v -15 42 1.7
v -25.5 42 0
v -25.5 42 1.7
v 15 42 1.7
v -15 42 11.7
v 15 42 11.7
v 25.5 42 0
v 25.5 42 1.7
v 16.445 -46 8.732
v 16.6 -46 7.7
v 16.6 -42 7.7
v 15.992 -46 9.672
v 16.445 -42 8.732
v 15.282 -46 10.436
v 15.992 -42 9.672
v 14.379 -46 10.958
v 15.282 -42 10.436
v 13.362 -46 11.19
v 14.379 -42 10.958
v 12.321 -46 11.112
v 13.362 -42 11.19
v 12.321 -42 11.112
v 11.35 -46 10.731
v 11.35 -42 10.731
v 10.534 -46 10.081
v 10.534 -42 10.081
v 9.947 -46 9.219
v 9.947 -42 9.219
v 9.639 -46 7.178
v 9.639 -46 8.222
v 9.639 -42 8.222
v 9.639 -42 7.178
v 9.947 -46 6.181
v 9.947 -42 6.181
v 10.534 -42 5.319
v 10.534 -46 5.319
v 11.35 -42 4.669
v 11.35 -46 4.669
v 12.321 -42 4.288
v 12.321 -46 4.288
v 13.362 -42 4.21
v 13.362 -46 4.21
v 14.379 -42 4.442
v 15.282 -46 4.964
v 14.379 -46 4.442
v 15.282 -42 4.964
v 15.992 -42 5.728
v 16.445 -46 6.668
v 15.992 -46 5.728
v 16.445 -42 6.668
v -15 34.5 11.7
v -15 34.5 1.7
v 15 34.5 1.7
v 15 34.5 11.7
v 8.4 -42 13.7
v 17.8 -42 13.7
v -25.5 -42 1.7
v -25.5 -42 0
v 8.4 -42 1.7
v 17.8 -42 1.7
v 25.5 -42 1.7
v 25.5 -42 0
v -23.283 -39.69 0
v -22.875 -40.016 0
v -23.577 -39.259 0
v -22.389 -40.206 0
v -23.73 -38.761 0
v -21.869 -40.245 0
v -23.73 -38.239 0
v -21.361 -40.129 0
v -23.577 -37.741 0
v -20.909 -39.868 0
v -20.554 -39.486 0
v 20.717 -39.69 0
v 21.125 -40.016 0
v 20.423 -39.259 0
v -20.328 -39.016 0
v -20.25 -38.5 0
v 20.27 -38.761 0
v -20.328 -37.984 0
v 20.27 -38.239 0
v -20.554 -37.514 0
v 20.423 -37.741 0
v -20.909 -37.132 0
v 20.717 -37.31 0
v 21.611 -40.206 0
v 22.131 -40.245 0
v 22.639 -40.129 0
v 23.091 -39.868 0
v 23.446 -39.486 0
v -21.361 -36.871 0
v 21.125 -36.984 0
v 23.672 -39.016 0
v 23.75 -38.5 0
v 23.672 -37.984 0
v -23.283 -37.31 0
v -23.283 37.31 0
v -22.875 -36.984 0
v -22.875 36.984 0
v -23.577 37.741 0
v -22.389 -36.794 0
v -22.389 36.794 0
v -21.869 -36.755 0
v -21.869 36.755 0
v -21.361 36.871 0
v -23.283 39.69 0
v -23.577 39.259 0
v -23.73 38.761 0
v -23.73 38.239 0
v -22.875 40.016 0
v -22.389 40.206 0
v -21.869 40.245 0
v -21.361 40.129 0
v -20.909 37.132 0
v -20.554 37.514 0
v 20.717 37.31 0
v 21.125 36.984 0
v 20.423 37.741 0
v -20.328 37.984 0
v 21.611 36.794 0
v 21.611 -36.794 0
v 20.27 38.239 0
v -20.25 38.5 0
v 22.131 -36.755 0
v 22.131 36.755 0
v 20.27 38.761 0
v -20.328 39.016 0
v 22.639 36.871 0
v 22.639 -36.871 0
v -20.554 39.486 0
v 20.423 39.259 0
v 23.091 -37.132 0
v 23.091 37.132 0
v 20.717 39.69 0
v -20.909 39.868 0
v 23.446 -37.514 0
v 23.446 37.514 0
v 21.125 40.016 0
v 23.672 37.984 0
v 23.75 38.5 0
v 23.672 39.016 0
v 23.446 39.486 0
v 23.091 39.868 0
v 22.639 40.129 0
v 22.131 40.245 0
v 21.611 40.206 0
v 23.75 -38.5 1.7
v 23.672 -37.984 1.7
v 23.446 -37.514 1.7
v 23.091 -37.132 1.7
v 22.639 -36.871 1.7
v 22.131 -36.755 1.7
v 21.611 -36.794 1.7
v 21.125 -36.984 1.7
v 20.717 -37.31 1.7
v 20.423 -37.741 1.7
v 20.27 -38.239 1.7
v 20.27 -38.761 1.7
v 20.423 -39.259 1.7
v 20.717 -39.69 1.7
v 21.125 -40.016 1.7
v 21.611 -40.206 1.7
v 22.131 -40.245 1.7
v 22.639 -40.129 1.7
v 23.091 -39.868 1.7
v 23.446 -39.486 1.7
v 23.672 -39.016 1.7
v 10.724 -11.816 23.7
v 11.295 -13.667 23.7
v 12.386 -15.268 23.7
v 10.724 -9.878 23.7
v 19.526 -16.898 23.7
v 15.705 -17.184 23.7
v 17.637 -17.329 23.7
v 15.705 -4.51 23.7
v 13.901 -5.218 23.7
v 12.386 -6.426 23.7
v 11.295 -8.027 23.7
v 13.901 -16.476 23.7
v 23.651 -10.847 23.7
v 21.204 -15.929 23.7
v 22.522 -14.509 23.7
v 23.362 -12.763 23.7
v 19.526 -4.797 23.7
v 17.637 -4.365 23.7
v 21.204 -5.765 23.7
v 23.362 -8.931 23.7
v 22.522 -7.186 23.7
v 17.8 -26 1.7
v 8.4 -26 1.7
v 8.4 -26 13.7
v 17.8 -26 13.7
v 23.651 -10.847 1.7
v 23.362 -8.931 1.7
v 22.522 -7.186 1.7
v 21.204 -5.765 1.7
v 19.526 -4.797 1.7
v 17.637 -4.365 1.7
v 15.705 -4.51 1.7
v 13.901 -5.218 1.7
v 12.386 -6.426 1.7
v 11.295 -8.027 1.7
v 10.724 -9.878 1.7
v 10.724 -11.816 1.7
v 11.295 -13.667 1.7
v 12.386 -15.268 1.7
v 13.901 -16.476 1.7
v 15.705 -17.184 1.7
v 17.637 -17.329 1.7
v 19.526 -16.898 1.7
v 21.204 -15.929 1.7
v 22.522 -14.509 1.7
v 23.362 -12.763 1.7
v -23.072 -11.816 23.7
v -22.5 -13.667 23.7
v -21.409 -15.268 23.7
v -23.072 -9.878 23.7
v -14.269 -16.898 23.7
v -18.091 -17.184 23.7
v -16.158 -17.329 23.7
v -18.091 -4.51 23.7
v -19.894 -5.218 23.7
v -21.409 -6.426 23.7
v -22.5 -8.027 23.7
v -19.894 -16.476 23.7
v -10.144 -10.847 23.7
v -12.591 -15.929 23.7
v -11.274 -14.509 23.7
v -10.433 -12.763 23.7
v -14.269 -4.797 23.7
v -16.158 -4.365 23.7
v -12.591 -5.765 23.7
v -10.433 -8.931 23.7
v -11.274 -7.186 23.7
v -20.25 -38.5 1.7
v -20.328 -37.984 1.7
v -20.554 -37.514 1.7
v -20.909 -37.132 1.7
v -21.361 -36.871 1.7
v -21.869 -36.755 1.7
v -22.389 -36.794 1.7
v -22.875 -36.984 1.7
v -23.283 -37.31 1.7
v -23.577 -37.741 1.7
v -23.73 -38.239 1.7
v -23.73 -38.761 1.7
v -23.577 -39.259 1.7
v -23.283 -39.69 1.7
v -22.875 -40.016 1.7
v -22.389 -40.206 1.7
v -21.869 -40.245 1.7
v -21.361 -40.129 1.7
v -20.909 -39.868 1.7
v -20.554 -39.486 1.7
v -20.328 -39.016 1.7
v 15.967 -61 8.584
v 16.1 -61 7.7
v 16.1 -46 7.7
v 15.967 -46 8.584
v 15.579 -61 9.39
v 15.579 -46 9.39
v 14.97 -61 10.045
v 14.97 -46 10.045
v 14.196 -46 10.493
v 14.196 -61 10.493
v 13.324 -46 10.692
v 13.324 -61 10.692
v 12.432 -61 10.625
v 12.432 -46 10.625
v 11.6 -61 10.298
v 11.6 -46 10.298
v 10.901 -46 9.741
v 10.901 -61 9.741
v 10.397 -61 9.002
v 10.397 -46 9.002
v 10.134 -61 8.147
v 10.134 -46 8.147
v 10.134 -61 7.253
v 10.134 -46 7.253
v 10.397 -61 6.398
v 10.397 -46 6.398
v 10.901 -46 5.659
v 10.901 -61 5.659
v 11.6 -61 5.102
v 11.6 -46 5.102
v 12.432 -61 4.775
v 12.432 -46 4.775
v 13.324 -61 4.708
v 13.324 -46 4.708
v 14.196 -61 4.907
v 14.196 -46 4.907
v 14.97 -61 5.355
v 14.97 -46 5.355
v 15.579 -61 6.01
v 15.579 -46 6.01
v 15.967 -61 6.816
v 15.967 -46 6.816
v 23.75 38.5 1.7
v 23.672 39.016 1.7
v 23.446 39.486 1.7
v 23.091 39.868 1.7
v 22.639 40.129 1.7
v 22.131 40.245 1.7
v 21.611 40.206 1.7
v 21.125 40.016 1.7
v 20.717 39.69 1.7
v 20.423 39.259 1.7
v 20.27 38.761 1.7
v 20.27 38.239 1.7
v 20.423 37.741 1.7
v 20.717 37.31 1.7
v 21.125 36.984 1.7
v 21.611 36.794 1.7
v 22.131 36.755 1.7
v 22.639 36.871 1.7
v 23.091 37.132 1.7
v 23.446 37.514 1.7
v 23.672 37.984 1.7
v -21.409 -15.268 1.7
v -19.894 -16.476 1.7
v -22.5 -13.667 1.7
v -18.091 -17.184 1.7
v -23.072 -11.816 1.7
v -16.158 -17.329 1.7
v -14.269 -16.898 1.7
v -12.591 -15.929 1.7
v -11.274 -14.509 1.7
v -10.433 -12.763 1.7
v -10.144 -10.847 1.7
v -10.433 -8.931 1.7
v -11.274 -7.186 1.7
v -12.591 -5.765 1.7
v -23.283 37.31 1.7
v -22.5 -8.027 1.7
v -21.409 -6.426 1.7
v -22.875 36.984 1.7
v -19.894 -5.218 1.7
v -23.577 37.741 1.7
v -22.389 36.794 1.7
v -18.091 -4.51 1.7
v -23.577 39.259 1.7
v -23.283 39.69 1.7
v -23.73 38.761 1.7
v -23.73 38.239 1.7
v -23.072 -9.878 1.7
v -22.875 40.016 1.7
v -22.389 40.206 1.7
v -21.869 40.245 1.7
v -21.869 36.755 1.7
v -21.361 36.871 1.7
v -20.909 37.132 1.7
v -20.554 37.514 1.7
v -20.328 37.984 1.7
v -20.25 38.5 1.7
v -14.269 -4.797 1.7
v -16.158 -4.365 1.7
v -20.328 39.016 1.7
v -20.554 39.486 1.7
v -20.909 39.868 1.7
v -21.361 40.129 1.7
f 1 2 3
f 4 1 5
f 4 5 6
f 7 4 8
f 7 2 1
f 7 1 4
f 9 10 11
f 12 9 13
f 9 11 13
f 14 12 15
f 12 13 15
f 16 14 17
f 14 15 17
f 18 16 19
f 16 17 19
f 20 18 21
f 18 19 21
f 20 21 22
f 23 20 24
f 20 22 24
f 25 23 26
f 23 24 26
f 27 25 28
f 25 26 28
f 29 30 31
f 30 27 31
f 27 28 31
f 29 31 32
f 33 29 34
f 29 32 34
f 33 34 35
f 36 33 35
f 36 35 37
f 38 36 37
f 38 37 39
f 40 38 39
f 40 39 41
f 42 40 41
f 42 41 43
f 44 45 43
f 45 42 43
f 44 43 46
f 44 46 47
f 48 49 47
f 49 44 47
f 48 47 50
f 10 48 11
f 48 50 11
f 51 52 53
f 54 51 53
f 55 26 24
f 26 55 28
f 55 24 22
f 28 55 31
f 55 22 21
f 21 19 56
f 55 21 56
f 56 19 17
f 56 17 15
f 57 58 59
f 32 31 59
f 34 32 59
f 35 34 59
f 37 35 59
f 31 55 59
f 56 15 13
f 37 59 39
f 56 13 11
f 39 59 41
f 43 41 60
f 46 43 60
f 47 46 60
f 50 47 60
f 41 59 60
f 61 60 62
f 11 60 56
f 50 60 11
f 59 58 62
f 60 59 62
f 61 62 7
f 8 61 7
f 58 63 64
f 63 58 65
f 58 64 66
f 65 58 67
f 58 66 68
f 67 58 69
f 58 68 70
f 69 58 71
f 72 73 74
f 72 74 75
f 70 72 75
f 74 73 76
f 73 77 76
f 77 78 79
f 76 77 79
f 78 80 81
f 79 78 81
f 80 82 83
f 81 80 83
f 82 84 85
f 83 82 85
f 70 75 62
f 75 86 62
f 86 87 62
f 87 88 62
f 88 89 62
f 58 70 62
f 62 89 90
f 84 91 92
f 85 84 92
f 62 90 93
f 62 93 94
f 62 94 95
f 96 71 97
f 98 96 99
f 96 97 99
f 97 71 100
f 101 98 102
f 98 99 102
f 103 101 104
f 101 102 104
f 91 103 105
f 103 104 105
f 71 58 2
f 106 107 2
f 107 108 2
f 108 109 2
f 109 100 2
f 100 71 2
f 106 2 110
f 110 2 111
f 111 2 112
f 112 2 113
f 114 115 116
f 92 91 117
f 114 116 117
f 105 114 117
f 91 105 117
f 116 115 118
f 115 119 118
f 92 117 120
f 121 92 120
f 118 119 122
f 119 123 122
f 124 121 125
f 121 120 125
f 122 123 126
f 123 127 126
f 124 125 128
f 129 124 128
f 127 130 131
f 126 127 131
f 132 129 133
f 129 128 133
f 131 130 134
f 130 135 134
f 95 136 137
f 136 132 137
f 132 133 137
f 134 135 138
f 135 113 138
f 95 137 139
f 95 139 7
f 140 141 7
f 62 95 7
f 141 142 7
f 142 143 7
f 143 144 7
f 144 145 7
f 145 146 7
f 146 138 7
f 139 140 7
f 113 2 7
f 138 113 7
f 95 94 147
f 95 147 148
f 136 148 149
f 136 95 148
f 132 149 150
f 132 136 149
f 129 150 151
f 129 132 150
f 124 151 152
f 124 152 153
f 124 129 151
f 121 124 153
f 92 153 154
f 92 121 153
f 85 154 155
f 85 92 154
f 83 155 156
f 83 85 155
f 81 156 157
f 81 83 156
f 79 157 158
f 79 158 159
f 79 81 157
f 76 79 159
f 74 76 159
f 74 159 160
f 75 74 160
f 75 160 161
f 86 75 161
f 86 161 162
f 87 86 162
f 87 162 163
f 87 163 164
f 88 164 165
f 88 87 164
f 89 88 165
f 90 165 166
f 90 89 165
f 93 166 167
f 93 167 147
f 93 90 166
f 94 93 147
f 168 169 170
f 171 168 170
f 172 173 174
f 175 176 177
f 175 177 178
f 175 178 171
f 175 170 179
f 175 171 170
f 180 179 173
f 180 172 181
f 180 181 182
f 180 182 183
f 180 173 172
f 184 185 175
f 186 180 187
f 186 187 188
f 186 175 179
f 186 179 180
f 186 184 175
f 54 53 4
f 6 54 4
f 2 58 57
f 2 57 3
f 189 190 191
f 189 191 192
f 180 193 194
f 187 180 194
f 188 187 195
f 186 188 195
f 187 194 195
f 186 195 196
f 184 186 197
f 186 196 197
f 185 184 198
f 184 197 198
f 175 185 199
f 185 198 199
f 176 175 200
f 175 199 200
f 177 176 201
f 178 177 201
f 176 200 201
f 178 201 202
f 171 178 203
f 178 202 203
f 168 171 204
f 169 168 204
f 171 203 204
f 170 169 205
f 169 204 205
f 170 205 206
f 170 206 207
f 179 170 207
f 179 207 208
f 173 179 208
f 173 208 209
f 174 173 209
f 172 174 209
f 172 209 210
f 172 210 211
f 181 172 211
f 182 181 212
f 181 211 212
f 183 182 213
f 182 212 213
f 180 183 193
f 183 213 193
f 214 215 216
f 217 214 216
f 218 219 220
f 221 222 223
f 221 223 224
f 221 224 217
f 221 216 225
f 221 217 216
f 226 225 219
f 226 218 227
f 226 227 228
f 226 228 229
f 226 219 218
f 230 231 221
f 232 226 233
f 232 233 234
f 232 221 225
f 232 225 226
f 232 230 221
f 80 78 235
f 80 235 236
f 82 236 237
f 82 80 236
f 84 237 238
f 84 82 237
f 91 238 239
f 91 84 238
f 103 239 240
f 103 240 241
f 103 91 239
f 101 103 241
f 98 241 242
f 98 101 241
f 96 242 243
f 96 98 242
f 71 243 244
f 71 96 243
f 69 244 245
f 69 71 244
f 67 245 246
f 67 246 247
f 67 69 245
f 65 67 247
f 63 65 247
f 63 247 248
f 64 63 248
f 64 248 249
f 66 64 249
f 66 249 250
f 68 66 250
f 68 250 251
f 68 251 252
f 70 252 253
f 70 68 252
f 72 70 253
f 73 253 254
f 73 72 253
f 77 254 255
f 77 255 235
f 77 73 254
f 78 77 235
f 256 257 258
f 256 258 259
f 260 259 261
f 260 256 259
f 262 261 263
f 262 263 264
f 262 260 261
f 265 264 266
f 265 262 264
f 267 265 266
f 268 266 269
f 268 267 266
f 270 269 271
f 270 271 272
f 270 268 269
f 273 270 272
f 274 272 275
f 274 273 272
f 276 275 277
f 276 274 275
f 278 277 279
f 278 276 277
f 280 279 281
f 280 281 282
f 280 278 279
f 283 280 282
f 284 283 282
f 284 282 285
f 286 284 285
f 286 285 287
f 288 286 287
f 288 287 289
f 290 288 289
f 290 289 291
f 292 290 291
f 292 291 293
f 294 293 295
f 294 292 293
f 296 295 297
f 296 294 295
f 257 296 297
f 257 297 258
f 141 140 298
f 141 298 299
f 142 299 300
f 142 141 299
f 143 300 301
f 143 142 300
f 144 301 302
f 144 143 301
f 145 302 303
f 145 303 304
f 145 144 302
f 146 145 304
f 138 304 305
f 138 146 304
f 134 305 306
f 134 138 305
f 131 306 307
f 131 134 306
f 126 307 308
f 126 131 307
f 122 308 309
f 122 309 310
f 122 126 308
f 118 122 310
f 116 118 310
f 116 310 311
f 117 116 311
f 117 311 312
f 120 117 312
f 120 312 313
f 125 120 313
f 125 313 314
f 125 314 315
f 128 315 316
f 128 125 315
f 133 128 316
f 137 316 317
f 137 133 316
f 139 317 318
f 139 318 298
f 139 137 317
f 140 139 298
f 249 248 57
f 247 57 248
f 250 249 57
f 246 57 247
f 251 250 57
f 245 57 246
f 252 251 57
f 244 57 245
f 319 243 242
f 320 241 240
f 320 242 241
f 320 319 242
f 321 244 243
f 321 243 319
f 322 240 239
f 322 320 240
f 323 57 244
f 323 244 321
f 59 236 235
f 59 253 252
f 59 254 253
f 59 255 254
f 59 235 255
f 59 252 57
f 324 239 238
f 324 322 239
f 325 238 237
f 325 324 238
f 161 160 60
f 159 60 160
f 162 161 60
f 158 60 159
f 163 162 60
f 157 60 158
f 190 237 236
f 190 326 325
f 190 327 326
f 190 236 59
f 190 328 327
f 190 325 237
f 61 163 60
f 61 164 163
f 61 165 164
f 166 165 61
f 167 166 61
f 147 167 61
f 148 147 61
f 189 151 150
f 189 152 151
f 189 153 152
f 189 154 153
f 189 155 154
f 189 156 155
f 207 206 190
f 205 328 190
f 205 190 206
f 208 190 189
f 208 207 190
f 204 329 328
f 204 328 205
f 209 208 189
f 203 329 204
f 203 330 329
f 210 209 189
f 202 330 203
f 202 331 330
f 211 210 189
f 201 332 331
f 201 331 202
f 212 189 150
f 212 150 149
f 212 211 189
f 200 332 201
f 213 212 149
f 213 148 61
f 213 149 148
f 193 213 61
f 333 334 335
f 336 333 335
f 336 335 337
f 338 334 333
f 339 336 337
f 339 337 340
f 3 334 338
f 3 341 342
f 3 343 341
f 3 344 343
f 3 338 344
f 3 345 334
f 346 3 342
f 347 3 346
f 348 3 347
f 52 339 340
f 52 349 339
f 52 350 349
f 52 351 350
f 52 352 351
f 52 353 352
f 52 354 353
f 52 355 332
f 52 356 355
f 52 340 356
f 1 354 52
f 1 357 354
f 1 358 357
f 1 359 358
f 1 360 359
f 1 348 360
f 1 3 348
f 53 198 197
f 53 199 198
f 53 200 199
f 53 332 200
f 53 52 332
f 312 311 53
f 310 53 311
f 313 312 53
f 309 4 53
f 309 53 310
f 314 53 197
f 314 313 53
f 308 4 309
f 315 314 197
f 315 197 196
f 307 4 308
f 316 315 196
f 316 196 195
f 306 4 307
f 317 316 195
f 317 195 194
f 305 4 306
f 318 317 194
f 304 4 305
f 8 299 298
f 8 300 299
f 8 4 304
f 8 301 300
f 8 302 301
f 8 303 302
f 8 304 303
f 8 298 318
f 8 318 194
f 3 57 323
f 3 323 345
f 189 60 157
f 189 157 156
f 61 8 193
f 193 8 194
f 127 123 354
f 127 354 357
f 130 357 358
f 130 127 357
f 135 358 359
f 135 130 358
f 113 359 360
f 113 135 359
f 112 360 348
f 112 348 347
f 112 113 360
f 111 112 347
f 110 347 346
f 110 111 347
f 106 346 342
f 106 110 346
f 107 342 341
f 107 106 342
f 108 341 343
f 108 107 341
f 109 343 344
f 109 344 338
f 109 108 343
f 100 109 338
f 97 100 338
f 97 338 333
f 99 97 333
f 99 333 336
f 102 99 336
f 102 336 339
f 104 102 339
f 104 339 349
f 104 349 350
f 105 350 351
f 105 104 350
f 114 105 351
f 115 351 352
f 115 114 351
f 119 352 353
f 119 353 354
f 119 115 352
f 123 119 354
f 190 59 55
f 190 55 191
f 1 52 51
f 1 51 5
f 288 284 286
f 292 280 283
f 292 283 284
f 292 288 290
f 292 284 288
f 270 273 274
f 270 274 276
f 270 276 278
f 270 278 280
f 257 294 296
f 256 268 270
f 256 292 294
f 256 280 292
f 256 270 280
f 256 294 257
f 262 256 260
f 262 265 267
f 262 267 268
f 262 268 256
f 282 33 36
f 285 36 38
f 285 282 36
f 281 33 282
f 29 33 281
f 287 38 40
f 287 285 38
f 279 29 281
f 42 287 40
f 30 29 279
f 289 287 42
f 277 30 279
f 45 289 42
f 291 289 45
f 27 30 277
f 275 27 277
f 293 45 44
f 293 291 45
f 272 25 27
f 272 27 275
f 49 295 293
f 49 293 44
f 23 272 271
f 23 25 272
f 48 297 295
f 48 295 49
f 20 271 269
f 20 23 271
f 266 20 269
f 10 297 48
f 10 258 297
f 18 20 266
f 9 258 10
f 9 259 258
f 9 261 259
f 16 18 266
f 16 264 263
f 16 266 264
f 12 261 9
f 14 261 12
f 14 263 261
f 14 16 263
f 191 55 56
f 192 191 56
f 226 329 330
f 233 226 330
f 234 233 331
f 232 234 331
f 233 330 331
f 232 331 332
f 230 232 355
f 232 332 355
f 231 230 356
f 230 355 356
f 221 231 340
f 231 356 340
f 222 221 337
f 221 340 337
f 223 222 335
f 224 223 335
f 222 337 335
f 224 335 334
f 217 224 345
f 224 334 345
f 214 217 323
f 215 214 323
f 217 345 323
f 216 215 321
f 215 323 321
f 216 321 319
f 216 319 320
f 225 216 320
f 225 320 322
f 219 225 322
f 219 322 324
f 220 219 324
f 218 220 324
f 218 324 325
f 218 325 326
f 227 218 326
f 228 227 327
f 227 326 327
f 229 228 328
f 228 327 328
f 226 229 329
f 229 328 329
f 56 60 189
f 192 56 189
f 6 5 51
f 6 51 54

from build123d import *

# Parameters (mm, degrees)
F0_W      = 51
F0_H      = 84
F0_R      = 1.75
F1_DEPTH  = 1.7
F2_W      = 9.4
F2_H      = 16
F3_DEPTH  = 12
F4_R      = 3.5
F5_DEPTH  = 19
F6_R      = 6.5
F7_DEPTH  = 22
F8_W      = 30
F8_H      = 7.5
F9_DEPTH  = 10
F10_R     = 5.9425868451
F10_R_2   = 3
F11_DEPTH = 15


with BuildPart() as f1:
    # F0 (on Top) → F1 (new body)
    with BuildSketch(Plane.XY):
        Rectangle(F0_W, F0_H)
        with Locations((-22, -38.5)):
            Circle(F0_R, mode=Mode.SUBTRACT)
        with Locations((22, -38.5)):
            Circle(F0_R, mode=Mode.SUBTRACT)
        with Locations((-22, 38.5)):
            Circle(F0_R, mode=Mode.SUBTRACT)
        with Locations((22, 38.5)):
            Circle(F0_R, mode=Mode.SUBTRACT)
    extrude(amount=F1_DEPTH)

    # F2 (on face) → F3 (join)
    with BuildSketch(Plane.XY.offset(1.7)):
        with Locations((13.1, -34)):
            Rectangle(F2_W, F2_H)
    extrude(amount=F3_DEPTH)

    # F4 (on face) → F5 (join)
    with BuildSketch(Plane.XZ.offset(42)):
        with Locations((13.1, 7.7)):
            Circle(F4_R)
    extrude(amount=F5_DEPTH)

    # F6 (on face) → F7 (join)
    with BuildSketch(Plane.XY.offset(1.7)):
        with Locations((17.1509794891, -10.8471838757)):
            Circle(F6_R)
        with Locations((-16.6441705078, -10.8471838757)):
            Circle(F6_R)
    extrude(amount=F7_DEPTH)

    # F8 (on face) → F9 (join)
    with BuildSketch(Plane.XY.offset(1.7)):
        with Locations((0, 38.25)):
            Rectangle(F8_W, F8_H)
    extrude(amount=F9_DEPTH)

    # F10 (on face) → F11 (cut)
    with BuildSketch(Plane.XZ.offset(61)):
        with Locations((13.1, 7.7)):
            Circle(F10_R)
        with Locations((13.1, 7.7)):
            Circle(F10_R_2, mode=Mode.SUBTRACT)
    extrude(amount=-F11_DEPTH, mode=Mode.SUBTRACT)


solid = f1.part
